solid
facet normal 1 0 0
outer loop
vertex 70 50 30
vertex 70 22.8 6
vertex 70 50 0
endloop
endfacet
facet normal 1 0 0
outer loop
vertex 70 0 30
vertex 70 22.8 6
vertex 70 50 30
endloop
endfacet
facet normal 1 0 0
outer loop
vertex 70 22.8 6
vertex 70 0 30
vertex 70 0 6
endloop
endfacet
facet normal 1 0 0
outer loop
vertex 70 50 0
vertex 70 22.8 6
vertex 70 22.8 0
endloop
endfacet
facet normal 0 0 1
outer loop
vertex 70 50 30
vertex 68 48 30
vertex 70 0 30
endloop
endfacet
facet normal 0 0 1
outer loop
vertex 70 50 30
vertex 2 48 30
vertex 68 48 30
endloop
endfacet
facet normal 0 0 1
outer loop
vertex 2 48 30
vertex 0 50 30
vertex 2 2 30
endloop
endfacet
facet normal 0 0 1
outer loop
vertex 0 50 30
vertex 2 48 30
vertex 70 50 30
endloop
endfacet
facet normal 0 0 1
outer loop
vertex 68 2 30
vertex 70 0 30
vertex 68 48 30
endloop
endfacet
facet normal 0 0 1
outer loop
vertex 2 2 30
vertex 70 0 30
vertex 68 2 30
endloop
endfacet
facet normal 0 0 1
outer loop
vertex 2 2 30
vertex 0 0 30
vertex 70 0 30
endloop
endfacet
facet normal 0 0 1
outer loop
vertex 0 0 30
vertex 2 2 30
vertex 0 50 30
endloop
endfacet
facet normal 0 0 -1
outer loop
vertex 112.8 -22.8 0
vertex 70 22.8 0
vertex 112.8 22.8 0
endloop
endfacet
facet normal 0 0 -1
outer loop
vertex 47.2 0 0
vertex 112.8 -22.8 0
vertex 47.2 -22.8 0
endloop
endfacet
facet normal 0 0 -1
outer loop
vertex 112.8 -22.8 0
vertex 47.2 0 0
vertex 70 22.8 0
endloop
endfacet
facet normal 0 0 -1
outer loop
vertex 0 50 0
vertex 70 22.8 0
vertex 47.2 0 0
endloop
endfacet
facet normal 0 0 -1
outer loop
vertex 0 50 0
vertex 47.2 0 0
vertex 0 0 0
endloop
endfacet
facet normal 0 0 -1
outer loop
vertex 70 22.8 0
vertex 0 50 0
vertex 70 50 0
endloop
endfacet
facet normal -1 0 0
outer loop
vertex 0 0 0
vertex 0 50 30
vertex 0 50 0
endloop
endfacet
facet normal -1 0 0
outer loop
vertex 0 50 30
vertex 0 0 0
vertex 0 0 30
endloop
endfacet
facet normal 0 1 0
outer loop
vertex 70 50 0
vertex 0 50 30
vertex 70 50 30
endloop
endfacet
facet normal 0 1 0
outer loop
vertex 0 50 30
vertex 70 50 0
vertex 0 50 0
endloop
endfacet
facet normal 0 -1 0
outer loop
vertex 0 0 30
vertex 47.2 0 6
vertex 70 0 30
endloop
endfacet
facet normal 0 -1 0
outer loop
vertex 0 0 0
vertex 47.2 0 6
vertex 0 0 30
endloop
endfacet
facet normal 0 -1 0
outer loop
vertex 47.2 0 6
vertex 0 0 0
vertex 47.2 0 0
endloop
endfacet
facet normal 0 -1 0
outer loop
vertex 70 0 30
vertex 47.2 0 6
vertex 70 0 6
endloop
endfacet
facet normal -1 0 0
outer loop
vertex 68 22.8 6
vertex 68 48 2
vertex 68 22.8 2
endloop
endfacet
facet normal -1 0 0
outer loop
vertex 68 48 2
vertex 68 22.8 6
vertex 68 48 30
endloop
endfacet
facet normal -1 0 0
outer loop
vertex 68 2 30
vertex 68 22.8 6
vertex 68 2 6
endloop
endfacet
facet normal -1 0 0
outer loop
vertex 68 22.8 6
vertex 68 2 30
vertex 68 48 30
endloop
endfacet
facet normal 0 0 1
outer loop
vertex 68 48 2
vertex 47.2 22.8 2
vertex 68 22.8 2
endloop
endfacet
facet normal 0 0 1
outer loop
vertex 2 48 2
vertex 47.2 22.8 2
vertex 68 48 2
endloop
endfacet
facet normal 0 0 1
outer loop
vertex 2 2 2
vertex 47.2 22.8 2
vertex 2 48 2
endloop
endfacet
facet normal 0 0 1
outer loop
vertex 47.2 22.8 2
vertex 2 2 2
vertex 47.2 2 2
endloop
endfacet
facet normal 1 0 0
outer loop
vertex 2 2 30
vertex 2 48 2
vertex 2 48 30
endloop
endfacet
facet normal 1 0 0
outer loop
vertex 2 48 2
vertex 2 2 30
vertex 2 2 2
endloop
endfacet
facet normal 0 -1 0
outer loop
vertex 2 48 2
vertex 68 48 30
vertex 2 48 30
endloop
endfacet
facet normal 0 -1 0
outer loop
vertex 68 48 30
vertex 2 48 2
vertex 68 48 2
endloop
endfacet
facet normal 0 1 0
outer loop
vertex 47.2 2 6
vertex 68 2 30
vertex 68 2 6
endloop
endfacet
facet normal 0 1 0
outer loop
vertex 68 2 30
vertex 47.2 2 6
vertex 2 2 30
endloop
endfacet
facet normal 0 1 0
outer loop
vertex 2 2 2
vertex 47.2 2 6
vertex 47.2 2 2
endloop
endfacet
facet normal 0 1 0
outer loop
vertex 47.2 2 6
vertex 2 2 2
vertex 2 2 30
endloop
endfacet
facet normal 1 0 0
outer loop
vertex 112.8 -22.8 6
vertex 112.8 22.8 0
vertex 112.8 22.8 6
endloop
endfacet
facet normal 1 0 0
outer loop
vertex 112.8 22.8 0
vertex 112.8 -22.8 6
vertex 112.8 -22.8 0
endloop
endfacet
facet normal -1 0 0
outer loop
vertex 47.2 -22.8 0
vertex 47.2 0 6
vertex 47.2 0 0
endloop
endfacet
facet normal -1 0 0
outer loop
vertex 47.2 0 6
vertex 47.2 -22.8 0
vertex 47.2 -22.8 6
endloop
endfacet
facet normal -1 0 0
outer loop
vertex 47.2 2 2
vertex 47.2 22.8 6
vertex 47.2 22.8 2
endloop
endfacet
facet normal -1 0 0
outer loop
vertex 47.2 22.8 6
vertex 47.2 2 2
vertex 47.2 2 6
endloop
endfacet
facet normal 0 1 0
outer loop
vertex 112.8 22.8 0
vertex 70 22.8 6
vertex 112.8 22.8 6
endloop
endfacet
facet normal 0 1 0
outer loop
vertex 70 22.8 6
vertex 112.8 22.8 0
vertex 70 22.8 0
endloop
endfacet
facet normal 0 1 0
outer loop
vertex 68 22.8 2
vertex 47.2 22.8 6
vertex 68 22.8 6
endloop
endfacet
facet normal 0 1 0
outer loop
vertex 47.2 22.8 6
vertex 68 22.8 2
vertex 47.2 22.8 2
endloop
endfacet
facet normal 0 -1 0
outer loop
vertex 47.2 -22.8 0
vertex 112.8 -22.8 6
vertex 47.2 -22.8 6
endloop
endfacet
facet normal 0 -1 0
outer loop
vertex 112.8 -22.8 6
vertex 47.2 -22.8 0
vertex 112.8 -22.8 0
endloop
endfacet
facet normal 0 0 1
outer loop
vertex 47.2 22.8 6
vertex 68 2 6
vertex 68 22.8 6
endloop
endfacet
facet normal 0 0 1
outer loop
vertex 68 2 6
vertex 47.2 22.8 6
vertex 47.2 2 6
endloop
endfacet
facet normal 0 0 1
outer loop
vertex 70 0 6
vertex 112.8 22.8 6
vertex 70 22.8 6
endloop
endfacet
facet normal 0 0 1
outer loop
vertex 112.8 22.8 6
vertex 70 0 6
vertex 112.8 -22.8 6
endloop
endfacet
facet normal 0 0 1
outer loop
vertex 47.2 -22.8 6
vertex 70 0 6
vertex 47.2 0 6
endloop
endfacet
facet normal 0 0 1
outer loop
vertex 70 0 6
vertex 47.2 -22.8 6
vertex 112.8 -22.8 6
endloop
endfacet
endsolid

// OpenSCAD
// Two-part enclosure for small electronics board
// Print orientation: box standing on bed (z = 0), lid on top, printed upside down

// ---------------- Parameters ----------------
box_x      = 70;    // box outer length (X)
box_y      = 50;    // box outer width (Y)
box_z      = 30;    // box outer height (Z)
box_wall   = 2;     // box wall thickness
box_floor  = 2;     // box floor thickness

gap        = 10;    // gap between box and lid

lip_wall   = 1.5;   // lid lip wall thickness
lip_h      = 4;     // lid lip height
lip_x      = 65.6;  // lid lip outer length (X)
lip_y      = 45.6;  // lid lip outer width (Y)

eps        = 0.5;   // cutter overshoot past faces

$fn = 64;

// ---------------- Derived ----------------
box_inner_x = box_x - 2 * box_wall;
box_inner_y = box_y - 2 * box_wall;
box_inner_z = box_z - box_floor;   // open-top cavity height

// ---------------- Model ----------------
union() {
    // Part 1: box, open top
    difference() {
        cube([box_x, box_y, box_z]);
        translate([box_wall, box_wall, box_floor])
            cube([box_inner_x, box_inner_y, box_inner_z + 0.01]); // tiny floor
    }

    // Part 2: lid, printed upside down
    translate([box_x + gap, 0, 0]) {
        // base plate
        translate([-lip_x / 2, -lip_y / 2, 0])
            cube([lip_x, lip_y, 2]);
        // lip on top (overhangs the plate, slides into box opening)
        translate([-lip_x / 2, -lip_y / 2, 2])
            cube([lip_x, lip_y, lip_h]);
    }
}
